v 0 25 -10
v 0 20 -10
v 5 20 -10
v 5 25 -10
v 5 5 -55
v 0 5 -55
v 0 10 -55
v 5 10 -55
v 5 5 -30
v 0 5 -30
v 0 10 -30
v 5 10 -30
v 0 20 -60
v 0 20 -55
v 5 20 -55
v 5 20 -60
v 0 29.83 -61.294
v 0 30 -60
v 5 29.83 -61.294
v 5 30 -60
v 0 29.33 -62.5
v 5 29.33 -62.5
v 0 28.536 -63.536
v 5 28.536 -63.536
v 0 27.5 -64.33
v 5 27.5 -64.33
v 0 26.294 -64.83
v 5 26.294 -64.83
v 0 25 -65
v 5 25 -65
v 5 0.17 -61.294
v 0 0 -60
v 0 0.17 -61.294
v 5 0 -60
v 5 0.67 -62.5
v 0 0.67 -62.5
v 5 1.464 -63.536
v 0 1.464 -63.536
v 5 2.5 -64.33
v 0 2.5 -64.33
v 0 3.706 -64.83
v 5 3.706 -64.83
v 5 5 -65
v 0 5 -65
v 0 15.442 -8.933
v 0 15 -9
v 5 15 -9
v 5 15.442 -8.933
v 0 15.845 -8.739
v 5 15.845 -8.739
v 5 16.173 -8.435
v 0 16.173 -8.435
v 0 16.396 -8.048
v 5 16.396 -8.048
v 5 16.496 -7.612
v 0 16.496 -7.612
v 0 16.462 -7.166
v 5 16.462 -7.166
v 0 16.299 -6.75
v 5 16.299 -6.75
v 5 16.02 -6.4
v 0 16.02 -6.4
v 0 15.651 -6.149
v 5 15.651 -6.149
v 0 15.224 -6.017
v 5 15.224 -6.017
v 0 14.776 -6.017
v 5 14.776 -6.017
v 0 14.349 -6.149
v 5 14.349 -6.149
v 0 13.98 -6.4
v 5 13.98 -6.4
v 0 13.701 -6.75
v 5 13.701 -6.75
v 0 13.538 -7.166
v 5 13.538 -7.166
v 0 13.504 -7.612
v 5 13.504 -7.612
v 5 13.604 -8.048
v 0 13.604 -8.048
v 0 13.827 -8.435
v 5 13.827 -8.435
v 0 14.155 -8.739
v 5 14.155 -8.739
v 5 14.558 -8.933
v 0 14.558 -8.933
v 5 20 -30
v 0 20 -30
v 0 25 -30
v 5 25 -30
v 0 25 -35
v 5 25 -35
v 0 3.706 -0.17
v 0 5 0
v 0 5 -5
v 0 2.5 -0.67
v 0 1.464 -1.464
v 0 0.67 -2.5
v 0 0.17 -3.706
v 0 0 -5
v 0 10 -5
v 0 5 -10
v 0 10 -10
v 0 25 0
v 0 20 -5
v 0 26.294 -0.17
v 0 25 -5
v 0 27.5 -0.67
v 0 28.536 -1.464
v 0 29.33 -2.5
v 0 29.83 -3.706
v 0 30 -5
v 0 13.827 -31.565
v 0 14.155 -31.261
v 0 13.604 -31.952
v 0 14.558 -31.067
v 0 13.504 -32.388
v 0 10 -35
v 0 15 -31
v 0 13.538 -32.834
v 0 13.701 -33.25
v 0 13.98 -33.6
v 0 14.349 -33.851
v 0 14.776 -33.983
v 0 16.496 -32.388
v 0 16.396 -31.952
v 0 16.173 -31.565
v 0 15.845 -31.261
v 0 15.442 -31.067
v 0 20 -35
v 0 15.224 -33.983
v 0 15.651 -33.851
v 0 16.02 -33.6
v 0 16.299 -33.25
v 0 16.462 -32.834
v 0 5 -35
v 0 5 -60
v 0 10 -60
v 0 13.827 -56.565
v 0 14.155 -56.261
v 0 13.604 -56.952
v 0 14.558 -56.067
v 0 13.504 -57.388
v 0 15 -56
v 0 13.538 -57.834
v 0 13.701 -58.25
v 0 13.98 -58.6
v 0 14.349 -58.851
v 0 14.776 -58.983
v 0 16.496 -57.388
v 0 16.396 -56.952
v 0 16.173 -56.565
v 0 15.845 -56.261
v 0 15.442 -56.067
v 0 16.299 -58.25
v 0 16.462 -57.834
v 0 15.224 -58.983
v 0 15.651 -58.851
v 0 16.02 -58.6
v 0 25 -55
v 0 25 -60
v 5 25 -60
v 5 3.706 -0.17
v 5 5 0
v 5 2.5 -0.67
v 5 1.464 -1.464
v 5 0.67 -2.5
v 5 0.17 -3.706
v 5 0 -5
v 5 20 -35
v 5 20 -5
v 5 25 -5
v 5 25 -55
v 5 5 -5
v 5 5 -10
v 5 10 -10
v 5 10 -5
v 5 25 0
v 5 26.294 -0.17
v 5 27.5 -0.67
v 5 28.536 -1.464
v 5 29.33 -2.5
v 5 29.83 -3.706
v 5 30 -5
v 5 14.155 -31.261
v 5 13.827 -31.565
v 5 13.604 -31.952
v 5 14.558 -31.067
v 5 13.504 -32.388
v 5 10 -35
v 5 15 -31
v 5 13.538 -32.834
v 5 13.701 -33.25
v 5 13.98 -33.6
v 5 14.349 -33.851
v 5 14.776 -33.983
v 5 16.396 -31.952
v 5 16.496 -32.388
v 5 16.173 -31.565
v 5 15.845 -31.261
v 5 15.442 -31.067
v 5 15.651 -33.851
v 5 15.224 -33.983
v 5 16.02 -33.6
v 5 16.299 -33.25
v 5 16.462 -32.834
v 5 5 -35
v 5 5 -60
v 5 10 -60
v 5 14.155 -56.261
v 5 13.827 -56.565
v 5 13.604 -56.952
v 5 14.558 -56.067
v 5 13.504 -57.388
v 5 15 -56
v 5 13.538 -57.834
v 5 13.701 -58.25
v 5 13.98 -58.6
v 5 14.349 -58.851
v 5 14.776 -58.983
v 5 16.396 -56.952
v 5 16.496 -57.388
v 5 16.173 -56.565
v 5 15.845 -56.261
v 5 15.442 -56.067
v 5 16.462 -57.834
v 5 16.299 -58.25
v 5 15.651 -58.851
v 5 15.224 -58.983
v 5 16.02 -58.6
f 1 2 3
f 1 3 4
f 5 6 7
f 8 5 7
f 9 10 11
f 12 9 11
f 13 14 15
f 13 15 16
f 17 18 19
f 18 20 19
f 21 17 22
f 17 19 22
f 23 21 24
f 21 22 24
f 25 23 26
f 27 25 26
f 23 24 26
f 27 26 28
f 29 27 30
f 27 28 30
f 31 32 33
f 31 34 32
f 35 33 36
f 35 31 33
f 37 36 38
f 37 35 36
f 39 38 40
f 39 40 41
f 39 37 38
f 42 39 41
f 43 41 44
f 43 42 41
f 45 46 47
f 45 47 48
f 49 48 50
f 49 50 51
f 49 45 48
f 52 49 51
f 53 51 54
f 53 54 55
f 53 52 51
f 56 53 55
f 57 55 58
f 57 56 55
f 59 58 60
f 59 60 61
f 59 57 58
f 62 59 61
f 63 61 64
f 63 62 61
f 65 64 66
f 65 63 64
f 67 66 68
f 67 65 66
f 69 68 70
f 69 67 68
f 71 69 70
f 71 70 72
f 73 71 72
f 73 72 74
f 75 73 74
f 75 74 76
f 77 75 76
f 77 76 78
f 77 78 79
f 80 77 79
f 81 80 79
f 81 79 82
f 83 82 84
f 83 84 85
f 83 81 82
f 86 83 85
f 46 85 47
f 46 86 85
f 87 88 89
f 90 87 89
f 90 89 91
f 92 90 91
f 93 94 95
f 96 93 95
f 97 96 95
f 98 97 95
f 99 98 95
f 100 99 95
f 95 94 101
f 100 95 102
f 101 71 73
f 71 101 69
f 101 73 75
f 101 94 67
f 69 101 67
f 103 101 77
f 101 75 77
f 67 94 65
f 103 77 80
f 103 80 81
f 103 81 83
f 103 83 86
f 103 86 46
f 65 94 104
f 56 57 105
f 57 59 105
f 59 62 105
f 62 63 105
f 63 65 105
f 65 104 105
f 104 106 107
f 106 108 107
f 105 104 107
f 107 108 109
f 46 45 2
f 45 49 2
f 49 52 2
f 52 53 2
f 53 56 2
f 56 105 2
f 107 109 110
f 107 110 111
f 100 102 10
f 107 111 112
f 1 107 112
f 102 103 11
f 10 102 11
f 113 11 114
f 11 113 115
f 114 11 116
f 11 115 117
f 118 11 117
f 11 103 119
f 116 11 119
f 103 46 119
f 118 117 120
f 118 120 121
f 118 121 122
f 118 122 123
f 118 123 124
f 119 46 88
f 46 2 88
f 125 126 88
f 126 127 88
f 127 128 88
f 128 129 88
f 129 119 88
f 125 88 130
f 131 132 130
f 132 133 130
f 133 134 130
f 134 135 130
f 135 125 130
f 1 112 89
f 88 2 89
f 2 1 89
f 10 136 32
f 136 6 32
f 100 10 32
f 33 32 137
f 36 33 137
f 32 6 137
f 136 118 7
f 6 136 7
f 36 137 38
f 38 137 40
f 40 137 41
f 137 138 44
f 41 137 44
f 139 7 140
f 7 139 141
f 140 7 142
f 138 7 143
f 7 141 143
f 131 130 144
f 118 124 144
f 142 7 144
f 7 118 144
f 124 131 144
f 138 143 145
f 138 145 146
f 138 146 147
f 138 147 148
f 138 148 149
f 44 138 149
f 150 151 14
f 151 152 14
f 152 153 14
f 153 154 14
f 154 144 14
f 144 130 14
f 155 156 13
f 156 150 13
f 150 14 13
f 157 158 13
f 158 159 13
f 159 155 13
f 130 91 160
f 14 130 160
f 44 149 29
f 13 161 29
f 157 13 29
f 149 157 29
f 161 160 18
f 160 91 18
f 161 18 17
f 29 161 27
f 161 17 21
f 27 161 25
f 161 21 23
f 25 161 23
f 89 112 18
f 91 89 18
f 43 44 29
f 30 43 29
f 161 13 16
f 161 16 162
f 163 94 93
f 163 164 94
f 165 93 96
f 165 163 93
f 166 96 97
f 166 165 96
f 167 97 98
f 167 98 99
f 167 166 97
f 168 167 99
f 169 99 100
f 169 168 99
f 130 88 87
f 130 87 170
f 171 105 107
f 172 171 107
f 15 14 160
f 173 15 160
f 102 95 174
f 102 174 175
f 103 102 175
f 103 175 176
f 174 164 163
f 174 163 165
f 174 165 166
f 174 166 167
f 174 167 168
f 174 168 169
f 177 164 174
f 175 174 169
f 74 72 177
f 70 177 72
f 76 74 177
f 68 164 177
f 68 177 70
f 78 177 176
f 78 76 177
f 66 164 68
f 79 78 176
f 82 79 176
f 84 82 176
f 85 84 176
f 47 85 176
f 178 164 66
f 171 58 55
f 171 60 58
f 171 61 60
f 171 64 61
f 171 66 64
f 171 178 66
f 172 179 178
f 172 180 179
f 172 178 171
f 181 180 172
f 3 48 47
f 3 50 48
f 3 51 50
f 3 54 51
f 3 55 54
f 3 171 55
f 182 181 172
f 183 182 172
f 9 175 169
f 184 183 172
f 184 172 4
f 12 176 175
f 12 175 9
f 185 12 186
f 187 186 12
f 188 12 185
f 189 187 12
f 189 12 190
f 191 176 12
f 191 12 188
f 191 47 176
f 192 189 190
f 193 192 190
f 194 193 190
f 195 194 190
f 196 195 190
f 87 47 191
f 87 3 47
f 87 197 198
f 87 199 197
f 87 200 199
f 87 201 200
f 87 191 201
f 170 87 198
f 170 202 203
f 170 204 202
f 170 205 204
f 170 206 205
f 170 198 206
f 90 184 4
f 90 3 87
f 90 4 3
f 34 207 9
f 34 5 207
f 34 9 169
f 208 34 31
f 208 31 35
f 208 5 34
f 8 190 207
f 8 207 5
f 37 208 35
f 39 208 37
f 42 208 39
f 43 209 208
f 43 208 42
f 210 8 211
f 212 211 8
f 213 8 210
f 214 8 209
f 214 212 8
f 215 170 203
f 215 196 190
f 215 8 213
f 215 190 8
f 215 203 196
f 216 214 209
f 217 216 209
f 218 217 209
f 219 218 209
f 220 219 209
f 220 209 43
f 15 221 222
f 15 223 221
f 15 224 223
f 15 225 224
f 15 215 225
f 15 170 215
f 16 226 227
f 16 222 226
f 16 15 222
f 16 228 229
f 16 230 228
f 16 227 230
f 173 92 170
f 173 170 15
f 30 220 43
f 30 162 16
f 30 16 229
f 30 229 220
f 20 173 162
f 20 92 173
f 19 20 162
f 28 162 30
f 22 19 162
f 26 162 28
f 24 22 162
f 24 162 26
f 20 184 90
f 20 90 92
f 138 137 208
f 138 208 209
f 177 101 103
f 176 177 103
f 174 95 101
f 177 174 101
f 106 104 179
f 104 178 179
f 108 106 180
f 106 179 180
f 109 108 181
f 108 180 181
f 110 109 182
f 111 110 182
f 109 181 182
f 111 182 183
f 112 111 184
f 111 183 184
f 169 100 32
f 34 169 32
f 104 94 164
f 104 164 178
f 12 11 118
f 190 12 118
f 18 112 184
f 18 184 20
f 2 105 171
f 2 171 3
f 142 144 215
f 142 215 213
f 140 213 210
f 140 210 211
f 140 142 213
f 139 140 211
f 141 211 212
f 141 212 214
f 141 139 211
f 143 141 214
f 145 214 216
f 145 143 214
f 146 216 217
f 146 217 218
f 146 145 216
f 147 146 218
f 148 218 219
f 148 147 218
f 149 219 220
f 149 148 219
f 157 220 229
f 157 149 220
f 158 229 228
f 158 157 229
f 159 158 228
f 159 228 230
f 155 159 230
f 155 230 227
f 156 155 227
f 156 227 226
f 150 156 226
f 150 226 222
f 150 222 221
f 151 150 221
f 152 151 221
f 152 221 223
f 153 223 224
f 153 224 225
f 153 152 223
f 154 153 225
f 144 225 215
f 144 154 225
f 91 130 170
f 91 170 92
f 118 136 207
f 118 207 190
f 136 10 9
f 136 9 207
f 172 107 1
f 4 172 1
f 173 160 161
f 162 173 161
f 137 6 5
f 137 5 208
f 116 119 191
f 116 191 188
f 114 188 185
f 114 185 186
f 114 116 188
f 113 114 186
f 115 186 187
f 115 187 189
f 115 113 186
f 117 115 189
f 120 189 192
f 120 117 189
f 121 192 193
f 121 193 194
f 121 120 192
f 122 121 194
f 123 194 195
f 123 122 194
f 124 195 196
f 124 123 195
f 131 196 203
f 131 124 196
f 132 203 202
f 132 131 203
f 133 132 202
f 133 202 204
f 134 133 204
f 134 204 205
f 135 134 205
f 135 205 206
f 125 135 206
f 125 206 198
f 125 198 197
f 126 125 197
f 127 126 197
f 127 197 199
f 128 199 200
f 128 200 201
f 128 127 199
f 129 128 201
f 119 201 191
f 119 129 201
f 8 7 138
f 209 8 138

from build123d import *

# Parameters (mm, degrees)
SKETCH1_W           = 65
SKETCH1_H           = 30
SKETCH1_R           = 1.5
SKETCH1_W_2         = 5
SKETCH1_H_2         = 5
BOSS_EXTRUDE1_DEPTH = 5
FILLET1_R           = 5


with BuildPart() as part:
    # Sketch1 → Boss-Extrude1 (new body)
    with BuildSketch(Plane(origin=(0, 0, 0), x_dir=(0, 0, -1), z_dir=(1, 0, 0))):
        with Locations((32.5, 15)):
            Rectangle(SKETCH1_W, SKETCH1_H)
        with Locations((7.5, 15)):
            Circle(SKETCH1_R, mode=Mode.SUBTRACT)
        with Locations(Location((57.5, 15, 0), (0, 0, 180))):
            Circle(SKETCH1_R, mode=Mode.SUBTRACT)
        with Locations(Location((32.5, 15, 0), (0, 0, 180))):
            Circle(SKETCH1_R, mode=Mode.SUBTRACT)
        with Locations((7.5, 22.5)):
            Rectangle(SKETCH1_W_2, SKETCH1_H_2, mode=Mode.SUBTRACT)
        with Locations((7.5, 7.5)):
            Rectangle(SKETCH1_W_2, SKETCH1_H_2, mode=Mode.SUBTRACT)
        with Locations((57.5, 22.5)):
            Rectangle(SKETCH1_W_2, SKETCH1_H_2, mode=Mode.SUBTRACT)
        with Locations((57.5, 7.5)):
            Rectangle(SKETCH1_W_2, SKETCH1_H_2, mode=Mode.SUBTRACT)
        with Locations((32.5, 22.5)):
            Rectangle(SKETCH1_W_2, SKETCH1_H_2, mode=Mode.SUBTRACT)
        with Locations((32.5, 7.5)):
            Rectangle(SKETCH1_W_2, SKETCH1_H_2, mode=Mode.SUBTRACT)
    extrude(amount=BOSS_EXTRUDE1_DEPTH)

    # Fillet1
    fillet1_edges = [part.edges().sort_by_distance(p)[0] for p in [
        (2.5, 30, 0),
        (2.5, 30, -65),
        (2.5, 0, -65),
        (2.5, 0, 0),
    ]]
    fillet(fillet1_edges, radius=FILLET1_R)


solid = part.part
